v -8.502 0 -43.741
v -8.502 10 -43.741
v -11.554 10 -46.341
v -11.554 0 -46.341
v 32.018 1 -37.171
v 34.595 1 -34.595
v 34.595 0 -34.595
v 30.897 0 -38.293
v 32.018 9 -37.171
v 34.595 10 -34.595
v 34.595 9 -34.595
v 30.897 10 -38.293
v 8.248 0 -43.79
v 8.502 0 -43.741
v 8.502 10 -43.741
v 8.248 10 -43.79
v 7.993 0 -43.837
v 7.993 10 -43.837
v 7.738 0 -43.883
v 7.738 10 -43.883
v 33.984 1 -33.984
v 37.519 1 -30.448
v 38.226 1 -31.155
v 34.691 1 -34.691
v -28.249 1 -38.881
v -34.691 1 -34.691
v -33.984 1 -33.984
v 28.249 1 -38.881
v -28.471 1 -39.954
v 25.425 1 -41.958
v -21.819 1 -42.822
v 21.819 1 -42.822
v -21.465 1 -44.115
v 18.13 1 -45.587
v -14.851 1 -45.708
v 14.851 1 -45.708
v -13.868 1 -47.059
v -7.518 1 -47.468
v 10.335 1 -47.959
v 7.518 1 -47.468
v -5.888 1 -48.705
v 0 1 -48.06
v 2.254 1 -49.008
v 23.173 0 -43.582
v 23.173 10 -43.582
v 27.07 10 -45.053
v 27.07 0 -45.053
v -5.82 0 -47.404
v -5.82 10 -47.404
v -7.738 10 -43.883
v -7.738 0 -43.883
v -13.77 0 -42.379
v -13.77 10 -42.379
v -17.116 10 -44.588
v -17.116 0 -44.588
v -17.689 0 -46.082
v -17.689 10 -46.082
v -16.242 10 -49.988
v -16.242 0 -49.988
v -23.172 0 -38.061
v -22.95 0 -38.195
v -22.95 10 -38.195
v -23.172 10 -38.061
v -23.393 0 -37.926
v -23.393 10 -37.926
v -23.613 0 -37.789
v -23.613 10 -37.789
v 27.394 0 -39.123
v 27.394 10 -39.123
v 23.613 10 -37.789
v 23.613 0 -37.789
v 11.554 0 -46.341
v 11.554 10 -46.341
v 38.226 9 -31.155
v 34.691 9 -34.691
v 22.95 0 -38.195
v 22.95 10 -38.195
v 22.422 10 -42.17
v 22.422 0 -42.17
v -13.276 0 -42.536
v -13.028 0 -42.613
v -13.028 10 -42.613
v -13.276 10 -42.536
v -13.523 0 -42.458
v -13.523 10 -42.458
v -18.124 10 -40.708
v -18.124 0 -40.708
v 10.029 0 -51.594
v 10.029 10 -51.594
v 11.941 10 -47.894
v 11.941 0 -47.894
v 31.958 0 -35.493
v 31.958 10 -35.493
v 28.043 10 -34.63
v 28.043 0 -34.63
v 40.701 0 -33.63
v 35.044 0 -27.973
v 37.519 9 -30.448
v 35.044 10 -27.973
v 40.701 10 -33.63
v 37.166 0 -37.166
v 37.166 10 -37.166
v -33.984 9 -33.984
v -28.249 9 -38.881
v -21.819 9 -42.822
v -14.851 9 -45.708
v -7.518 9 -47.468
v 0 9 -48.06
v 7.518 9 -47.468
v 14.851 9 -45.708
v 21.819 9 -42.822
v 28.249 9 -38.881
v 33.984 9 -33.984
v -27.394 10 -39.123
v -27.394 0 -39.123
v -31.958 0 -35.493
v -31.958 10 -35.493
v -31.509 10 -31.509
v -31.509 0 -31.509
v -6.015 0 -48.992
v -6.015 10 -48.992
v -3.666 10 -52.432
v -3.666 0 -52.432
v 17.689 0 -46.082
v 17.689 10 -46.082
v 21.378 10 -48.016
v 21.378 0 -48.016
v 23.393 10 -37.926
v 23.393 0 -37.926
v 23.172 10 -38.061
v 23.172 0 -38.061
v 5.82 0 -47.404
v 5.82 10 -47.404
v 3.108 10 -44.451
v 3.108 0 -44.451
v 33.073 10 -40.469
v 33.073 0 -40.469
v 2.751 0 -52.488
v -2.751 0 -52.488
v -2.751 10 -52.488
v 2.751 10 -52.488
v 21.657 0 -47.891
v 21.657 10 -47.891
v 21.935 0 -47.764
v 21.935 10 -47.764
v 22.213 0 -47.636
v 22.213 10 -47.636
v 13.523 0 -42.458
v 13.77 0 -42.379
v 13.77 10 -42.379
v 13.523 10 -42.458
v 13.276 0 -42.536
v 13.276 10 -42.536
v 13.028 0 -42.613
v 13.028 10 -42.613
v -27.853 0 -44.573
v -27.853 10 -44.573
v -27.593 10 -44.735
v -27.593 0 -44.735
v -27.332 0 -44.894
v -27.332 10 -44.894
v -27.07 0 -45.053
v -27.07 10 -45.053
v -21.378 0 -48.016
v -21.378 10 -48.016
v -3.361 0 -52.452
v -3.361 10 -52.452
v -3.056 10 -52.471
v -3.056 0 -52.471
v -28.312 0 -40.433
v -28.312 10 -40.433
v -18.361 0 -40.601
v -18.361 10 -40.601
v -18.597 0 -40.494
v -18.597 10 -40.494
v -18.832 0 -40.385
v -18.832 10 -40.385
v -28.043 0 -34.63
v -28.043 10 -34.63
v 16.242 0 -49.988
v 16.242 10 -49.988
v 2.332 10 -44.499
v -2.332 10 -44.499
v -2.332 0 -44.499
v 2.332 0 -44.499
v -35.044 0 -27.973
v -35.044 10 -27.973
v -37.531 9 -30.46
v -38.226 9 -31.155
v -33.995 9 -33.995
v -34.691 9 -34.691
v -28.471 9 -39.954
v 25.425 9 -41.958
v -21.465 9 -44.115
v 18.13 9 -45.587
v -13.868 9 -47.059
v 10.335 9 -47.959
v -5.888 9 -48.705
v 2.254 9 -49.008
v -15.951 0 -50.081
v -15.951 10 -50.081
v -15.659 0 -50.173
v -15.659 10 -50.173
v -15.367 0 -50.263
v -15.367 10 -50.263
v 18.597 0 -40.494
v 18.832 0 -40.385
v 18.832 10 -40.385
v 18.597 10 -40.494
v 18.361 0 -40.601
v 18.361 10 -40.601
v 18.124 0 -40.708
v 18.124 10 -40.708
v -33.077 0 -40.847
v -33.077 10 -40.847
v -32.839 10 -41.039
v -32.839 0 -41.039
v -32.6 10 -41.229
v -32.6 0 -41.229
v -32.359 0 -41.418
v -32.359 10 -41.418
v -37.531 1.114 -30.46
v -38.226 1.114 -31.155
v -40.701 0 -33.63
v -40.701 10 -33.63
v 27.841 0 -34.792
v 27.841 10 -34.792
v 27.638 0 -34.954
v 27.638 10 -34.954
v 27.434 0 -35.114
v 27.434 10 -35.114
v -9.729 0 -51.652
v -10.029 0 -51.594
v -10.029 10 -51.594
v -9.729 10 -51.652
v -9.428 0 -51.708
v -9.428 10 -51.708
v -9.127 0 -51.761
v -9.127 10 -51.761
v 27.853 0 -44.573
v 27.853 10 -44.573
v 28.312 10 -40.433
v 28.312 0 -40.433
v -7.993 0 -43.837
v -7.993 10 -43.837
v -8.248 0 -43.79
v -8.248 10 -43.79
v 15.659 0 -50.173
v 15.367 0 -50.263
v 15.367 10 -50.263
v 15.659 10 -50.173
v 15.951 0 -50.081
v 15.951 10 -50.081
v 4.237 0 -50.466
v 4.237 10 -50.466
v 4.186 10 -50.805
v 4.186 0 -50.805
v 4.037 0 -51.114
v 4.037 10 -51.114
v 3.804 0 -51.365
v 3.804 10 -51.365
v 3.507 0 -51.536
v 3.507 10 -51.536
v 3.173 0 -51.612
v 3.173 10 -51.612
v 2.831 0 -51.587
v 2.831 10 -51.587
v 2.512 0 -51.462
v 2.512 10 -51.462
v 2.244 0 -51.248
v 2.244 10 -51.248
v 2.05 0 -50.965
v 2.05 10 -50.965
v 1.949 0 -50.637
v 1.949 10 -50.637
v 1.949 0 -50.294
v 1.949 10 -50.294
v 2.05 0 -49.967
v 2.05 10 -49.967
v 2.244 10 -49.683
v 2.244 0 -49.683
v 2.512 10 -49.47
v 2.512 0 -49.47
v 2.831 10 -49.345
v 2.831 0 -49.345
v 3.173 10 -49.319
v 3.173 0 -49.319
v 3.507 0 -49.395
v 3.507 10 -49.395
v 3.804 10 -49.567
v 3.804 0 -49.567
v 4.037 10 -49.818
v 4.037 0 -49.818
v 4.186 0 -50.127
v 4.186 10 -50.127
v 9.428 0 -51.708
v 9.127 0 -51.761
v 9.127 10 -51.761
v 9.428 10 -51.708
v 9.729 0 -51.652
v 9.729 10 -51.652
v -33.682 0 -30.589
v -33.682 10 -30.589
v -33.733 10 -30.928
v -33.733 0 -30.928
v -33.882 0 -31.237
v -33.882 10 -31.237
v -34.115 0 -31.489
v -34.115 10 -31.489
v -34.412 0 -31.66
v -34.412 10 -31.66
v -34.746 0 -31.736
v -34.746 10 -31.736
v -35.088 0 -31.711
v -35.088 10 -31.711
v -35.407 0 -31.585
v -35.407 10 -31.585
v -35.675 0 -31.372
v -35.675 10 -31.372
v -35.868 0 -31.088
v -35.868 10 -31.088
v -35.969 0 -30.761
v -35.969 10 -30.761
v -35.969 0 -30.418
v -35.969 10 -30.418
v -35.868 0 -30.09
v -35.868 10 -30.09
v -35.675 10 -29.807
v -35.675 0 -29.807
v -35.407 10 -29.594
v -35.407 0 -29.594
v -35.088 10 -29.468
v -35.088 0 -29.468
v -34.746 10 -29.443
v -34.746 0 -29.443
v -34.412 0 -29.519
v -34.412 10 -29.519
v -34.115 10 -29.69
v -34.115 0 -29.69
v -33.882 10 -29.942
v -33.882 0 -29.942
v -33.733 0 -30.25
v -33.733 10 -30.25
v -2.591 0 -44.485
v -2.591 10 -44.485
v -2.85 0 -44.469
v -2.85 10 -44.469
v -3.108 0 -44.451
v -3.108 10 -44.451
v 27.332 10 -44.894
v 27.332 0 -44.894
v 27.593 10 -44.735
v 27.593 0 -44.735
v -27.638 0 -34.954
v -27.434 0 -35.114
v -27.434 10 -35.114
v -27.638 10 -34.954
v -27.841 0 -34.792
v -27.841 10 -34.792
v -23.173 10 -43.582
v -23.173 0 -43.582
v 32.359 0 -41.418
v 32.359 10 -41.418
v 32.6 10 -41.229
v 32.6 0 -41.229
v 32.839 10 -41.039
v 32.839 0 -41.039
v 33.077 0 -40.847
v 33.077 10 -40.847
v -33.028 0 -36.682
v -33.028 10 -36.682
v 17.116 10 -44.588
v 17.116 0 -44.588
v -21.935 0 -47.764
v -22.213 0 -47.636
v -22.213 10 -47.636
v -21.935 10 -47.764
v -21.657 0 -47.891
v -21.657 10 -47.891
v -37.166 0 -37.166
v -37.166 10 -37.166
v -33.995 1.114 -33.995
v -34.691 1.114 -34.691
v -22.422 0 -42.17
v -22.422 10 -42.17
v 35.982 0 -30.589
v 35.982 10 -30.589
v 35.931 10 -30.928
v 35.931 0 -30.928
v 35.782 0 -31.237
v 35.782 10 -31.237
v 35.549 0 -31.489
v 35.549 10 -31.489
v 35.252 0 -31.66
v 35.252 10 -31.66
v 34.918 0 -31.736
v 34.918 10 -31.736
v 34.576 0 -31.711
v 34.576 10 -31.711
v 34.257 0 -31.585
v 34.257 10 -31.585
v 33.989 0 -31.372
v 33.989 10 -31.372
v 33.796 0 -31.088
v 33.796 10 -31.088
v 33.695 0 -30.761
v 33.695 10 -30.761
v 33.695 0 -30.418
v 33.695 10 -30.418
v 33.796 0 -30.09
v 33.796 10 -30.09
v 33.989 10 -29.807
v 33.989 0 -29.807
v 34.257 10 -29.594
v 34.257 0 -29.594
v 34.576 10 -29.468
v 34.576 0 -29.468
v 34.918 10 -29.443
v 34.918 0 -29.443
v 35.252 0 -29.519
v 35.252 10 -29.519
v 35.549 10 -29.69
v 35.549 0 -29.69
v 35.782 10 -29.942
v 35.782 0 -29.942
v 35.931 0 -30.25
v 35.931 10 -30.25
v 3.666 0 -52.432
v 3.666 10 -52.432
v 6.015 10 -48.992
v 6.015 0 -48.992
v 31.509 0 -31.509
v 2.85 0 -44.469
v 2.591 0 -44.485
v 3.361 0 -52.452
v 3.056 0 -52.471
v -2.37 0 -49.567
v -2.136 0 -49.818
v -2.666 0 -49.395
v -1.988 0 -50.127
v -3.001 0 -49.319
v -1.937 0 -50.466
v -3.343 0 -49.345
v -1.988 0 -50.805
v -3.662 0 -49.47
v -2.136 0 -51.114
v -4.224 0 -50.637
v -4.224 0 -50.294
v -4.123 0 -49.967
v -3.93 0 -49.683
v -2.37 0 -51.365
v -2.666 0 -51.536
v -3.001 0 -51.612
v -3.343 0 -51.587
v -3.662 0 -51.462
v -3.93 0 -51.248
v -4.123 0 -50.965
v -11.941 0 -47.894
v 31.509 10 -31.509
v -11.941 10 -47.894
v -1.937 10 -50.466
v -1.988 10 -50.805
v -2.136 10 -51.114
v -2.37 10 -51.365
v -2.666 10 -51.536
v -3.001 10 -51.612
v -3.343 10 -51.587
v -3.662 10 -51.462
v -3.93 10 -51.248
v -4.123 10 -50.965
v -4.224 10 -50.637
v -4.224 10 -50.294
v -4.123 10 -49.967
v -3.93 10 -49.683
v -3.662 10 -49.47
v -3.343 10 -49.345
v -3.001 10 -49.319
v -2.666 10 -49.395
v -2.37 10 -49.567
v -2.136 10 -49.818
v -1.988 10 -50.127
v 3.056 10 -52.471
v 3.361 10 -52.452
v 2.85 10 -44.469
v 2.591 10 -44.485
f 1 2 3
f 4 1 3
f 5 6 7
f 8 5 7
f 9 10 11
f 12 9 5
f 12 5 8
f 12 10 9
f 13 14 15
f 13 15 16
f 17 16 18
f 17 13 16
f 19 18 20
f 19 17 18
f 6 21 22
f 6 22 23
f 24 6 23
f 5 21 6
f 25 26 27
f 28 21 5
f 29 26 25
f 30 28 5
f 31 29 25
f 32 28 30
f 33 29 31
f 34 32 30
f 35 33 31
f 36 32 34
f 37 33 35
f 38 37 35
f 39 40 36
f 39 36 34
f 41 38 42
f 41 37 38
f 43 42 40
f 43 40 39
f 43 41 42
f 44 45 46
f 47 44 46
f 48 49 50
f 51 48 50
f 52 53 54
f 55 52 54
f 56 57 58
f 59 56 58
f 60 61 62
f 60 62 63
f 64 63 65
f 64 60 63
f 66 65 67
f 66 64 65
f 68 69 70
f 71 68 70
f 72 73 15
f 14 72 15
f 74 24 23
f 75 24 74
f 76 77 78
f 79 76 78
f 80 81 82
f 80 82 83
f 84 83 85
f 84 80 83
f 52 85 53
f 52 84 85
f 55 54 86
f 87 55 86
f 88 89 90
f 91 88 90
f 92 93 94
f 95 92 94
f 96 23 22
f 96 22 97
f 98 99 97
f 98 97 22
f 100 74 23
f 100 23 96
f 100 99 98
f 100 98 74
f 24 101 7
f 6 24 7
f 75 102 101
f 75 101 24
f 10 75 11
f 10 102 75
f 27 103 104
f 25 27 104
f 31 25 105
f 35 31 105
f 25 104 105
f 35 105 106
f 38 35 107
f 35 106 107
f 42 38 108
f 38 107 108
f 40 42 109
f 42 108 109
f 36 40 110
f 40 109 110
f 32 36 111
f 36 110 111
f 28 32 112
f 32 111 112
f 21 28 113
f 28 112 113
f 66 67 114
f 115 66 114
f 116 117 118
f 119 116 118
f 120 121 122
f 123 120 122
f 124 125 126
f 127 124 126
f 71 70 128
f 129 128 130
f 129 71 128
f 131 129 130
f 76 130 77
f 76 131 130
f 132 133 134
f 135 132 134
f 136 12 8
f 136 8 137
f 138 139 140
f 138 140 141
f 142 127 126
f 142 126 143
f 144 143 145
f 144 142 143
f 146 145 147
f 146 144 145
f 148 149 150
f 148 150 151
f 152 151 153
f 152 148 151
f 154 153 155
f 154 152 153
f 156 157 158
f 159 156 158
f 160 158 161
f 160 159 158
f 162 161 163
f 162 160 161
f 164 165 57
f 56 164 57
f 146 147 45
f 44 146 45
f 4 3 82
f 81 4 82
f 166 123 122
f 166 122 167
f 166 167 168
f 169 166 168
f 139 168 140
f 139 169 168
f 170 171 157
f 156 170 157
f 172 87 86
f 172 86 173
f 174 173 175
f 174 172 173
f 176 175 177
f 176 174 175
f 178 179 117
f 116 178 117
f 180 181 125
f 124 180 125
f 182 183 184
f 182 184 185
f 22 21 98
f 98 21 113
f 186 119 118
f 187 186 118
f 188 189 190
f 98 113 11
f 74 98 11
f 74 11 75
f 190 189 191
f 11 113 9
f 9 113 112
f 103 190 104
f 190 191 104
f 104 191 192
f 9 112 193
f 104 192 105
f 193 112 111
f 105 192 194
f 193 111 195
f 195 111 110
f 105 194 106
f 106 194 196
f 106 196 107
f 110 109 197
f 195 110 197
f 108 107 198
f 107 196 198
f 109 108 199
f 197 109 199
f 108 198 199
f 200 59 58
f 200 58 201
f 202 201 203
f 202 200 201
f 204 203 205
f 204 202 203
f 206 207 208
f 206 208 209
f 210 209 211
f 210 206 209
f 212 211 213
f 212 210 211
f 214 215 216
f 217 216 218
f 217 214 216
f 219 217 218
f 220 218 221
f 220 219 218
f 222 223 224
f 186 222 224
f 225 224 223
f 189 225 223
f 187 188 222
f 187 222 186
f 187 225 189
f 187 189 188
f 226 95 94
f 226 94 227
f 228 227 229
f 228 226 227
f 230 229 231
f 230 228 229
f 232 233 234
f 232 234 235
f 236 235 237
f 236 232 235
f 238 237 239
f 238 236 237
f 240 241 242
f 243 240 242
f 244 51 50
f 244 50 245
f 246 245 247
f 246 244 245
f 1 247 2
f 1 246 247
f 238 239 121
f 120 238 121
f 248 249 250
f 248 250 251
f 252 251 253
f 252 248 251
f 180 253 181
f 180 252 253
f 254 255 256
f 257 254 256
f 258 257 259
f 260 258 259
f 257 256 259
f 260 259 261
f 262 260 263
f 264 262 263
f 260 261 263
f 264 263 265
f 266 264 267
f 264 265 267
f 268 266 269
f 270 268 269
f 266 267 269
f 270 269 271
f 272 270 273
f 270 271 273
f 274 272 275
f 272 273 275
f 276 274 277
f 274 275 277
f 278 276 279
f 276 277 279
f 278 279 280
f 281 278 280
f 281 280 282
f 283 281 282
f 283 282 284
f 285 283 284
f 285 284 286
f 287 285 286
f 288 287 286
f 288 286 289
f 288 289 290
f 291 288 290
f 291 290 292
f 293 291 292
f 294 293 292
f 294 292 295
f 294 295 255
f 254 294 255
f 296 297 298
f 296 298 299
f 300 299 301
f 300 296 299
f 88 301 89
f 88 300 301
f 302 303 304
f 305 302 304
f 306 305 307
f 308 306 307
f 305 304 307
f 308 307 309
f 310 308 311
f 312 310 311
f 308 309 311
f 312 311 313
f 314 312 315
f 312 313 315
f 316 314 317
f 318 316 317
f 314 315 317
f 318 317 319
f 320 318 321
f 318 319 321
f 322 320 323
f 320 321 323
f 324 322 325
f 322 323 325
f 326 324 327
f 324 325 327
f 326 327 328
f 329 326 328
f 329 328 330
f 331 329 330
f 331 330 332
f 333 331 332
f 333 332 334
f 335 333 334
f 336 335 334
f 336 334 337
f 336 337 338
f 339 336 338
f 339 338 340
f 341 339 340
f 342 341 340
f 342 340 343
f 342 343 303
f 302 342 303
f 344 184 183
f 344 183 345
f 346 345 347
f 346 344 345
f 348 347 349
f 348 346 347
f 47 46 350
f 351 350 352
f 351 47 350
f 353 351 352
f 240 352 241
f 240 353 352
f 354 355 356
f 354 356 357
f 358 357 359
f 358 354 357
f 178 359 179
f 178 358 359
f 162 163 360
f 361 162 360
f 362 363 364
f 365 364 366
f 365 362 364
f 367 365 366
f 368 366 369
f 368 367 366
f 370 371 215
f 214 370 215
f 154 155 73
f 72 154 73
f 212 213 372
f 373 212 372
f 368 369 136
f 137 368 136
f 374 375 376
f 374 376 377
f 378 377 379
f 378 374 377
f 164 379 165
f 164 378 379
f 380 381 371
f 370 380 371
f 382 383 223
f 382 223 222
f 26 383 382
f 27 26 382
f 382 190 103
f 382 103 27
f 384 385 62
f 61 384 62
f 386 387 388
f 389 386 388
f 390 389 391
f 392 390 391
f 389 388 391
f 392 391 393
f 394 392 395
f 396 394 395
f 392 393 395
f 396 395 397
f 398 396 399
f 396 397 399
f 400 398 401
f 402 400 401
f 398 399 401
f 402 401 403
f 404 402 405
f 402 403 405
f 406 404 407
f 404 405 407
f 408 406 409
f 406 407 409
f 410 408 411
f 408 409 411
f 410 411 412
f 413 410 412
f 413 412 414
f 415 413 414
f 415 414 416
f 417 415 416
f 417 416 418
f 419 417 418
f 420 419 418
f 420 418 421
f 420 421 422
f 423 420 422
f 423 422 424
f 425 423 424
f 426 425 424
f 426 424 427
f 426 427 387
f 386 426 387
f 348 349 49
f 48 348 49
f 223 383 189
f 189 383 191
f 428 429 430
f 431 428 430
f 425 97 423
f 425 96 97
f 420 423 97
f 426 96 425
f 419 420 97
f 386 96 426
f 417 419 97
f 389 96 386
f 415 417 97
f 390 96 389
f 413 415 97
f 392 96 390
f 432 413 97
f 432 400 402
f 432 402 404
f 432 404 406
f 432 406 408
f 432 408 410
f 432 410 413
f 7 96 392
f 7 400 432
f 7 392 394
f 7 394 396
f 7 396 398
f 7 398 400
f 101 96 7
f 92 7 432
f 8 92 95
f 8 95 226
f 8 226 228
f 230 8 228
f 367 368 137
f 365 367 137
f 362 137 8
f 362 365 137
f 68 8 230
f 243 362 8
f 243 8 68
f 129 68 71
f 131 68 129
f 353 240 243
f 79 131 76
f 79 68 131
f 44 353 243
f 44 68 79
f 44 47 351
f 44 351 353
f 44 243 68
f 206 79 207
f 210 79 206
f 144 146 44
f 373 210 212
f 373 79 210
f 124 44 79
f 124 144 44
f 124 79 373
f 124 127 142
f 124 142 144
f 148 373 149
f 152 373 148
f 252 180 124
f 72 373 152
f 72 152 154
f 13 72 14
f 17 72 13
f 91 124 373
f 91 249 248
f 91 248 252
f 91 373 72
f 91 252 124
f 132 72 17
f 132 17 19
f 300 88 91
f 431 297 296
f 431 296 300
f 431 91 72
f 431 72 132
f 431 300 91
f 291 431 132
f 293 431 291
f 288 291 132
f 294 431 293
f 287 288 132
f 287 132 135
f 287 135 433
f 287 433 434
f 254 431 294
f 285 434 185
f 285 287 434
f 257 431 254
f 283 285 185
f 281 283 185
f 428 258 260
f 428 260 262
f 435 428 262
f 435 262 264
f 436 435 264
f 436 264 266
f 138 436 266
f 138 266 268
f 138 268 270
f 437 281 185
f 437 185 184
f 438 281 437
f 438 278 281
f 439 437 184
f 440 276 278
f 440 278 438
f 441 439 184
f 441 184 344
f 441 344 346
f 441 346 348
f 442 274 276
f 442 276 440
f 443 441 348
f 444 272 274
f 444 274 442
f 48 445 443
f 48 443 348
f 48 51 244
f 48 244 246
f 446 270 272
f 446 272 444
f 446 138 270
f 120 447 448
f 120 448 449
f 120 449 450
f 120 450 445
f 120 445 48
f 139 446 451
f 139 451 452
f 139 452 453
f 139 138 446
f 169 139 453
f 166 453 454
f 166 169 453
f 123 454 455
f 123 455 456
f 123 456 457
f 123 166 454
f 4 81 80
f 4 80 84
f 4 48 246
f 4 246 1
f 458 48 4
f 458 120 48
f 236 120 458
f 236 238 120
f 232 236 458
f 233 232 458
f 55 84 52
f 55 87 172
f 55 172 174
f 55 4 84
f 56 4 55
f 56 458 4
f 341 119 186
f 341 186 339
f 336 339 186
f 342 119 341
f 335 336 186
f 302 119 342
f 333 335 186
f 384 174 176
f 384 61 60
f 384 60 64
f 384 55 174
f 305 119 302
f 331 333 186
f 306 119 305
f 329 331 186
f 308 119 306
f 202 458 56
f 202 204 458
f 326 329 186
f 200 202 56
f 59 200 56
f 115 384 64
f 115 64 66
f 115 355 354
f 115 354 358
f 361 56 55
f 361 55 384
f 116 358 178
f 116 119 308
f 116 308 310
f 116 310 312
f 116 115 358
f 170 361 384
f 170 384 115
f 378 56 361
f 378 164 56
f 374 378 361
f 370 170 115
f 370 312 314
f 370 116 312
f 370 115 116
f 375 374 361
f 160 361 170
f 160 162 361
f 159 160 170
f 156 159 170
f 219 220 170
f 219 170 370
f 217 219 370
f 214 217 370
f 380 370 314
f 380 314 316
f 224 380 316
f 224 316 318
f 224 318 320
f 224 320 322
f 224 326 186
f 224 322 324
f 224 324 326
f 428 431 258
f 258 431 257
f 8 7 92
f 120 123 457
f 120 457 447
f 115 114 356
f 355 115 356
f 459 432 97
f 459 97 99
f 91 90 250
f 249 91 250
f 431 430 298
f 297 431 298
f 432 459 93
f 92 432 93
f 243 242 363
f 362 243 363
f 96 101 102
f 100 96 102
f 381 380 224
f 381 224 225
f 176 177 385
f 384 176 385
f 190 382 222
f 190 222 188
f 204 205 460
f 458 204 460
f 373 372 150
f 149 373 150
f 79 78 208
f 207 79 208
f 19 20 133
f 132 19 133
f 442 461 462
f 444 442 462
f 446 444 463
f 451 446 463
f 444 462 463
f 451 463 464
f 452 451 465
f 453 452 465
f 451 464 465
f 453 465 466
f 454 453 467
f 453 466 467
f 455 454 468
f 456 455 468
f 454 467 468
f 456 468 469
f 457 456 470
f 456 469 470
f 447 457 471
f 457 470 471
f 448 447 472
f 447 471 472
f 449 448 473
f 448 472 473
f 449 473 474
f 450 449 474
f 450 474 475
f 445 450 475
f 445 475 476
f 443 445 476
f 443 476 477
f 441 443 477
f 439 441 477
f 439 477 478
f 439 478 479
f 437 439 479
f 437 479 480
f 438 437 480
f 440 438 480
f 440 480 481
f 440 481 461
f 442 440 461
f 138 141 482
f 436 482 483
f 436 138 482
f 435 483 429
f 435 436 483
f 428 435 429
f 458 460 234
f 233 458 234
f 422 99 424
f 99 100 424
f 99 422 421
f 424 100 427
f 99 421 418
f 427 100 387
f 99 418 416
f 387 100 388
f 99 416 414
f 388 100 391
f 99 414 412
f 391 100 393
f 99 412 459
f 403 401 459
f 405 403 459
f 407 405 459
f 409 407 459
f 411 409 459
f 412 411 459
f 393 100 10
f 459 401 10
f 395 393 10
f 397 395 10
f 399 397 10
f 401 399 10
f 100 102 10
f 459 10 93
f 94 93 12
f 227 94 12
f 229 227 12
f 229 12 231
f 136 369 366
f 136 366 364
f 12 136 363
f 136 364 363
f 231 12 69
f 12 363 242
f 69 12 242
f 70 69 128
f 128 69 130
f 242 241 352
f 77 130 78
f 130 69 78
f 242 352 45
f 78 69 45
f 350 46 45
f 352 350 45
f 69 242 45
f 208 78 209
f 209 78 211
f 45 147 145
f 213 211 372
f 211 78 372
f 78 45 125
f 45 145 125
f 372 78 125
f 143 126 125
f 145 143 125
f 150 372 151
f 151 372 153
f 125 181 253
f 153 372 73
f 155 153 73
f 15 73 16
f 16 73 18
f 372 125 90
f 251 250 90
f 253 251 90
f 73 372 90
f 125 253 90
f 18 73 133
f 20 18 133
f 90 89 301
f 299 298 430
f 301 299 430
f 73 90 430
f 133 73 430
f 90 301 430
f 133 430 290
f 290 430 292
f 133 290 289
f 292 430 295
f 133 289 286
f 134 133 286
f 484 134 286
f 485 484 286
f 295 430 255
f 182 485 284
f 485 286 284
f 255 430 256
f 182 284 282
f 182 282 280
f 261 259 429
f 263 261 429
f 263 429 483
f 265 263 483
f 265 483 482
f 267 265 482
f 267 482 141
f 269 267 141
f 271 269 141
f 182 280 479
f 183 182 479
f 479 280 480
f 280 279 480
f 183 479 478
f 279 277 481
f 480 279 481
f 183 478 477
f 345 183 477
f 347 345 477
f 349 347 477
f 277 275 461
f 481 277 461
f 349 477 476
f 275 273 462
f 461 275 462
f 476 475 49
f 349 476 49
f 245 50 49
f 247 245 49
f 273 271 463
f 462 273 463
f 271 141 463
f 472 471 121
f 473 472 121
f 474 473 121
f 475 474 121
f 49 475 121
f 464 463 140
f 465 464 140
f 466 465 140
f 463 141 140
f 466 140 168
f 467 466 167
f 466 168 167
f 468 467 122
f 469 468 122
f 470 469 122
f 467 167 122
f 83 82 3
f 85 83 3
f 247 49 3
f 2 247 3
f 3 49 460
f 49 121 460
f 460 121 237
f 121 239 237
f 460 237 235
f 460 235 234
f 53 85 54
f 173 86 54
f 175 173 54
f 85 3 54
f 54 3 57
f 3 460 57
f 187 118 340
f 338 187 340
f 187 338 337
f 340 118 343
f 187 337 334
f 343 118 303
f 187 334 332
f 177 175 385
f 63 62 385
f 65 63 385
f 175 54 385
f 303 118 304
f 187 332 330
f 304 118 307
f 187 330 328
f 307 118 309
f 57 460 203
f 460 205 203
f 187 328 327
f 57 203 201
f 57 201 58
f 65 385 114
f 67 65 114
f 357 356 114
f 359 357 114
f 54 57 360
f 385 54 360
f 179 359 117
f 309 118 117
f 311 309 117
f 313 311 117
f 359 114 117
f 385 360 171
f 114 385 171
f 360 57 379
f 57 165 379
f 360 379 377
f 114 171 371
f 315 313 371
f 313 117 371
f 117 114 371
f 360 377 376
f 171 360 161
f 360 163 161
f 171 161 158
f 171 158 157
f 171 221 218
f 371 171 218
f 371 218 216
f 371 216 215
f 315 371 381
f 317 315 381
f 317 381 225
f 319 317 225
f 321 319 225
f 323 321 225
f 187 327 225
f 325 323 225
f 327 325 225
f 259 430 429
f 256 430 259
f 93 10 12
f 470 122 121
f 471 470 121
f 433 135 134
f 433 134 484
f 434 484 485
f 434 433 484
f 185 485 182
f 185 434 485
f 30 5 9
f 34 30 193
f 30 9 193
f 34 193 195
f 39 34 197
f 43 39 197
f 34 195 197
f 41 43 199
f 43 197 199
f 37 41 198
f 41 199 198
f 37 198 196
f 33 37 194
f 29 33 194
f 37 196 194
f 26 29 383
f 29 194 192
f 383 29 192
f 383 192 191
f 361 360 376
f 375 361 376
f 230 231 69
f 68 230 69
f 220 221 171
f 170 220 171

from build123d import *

# Parameters (mm, degrees)
BOSS_EXTRUDE1_DEPTH = 10
CUT_EXTRUDE1_DEPTH  = 10
CIRPATTERN1_COUNT   = 13
CIRPATTERN1_ANGLE   = 84
CUT_EXTRUDE2_START  = -1
CUT_EXTRUDE2_DEPTH  = 8
SKETCH5_W           = 8
SKETCH5_H           = 10
SKETCH5_W_2         = 0.983564582
SKETCH5_H_2         = 7.885827621
BOSS_EXTRUDE2_DEPTH = 5
SKETCH6_W           = 8
SKETCH6_H           = 10
SKETCH6_W_2         = 1
SKETCH6_H_2         = 8
BOSS_EXTRUDE3_DEPTH = 5
SKETCH7_R           = 1.15
CUT_EXTRUDE3_DEPTH  = 20
SKETCH9_R           = 1.15
CUT_EXTRUDE4_DEPTH  = 26
SKETCH10_R          = 1.15
CUT_EXTRUDE5_DEPTH  = 26
BOSS_EXTRUDE4_DEPTH = 10
CUT_EXTRUDE7_DEPTH  = 26


with BuildPart() as part:
    # Sketch1 → Boss-Extrude1 (new body)
    with BuildSketch(Plane(origin=(0, 0, 0), x_dir=(1, 0, 0), z_dir=(0, 1, 0))):
        with BuildLine():
            Line((-31.50867817, 31.50867817), (-37.165532419, 37.165532419))
            ThreePointArc((-37.165532419, 37.165532419), (0, 52.56), (37.165532419, 37.165532419))
            Line((37.165532419, 37.165532419), (31.50867817, 31.50867817))
            ThreePointArc((31.50867817, 31.50867817), (0, 44.56), (-31.50867817, 31.50867817))
        make_face()
    extrude(amount=BOSS_EXTRUDE1_DEPTH)

    # Sketch3 → Cut-Extrude1 (cut)
    with BuildSketch(Plane(origin=(0, 10, 0), x_dir=(1, 0, 0), z_dir=(0, 1, 0))):
        with BuildLine():
            Line((-31.95767776, 35.492596865), (-31.50867817, 31.50867817))
            ThreePointArc((-31.50867817, 31.50867817), (-29.816459819, 33.114533423), (-28.042516625, 34.629624043))
            Line((-28.042516625, 34.629624043), (-31.95767776, 35.492596865))
        make_face()
        with BuildLine():
            Line((-33.02828673, 36.681628586), (-33.077079754, 40.846791734))
            ThreePointArc((-33.077079754, 40.846791734), (-35.16950467, 39.059692027), (-37.165532419, 37.165532419))
            Line((-37.165532419, 37.165532419), (-33.02828673, 36.681628586))
        make_face()
    cut_extrude1 = extrude(amount=-CUT_EXTRUDE1_DEPTH, mode=Mode.SUBTRACT)

    # CirPattern1: Cut-Extrude1 ×13 about axis
    cirpattern1_axis = Axis((0, 0, 0), (0, -1, 0))
    for i in range(1, CIRPATTERN1_COUNT):
        add(cut_extrude1.rotate(cirpattern1_axis, i * CIRPATTERN1_ANGLE / (CIRPATTERN1_COUNT - 1)), mode=Mode.SUBTRACT)

    # Sketch4 → Cut-Extrude2 (cut)
    with BuildSketch(Plane(origin=(0, 10, 0), x_dir=(1, 0, 0), z_dir=(0, 1, 0)).offset(CUT_EXTRUDE2_START)):
        with BuildLine():
            Line((33.983551904, 33.983551904), (34.690658685, 34.690658685))
            ThreePointArc((34.690658685, 34.690658685), (0, 49.06), (-34.690658685, 34.690658685))
            Line((-34.690658685, 34.690658685), (-33.983551904, 33.983551904))
            ThreePointArc((-33.983551904, 33.983551904), (0, 48.06), (33.983551904, 33.983551904))
        make_face()
    extrude(amount=-CUT_EXTRUDE2_DEPTH, mode=Mode.SUBTRACT)

    # Sketch5 → Boss-Extrude2 (add)
    with BuildSketch(Plane(origin=(0, 0, 0), x_dir=(0.707106781, 0, 0.707106781), z_dir=(-0.707106781, 0, 0.707106781))):
        with Locations((-48.56, 5)):
            Rectangle(SKETCH5_W, SKETCH5_H)
        with Locations((-48.568217709, 5.057086189)):
            Rectangle(SKETCH5_W_2, SKETCH5_H_2, mode=Mode.SUBTRACT)
    extrude(amount=BOSS_EXTRUDE2_DEPTH)

    # Sketch6 → Boss-Extrude3 (add)
    with BuildSketch(Plane(origin=(0, 0, 0), x_dir=(0.707106781, 0, -0.707106781), z_dir=(0.707106781, 0, 0.707106781))):
        with Locations((48.56, 5)):
            Rectangle(SKETCH6_W, SKETCH6_H)
        with Locations((48.56, 5)):
            Rectangle(SKETCH6_W_2, SKETCH6_H_2, mode=Mode.SUBTRACT)
    extrude(amount=BOSS_EXTRUDE3_DEPTH)

    # Sketch7 → Cut-Extrude3 (cut)
    with BuildSketch(Plane(origin=(0, 10, 0), x_dir=(1, 0, 0), z_dir=(0, 1, 0))):
        with Locations((-3.086614159, 50.465695408)):
            Circle(SKETCH7_R)
        with Locations((3.086614159, 50.465695408)):
            Circle(SKETCH7_R)
    extrude(amount=-CUT_EXTRUDE3_DEPTH, mode=Mode.SUBTRACT)

    # Sketch9 → Cut-Extrude4 (cut)
    with BuildSketch(Plane(origin=(0, 10, 0), x_dir=(1, 0, 0), z_dir=(0, 1, 0))):
        with Locations((34.832080041, 30.589439354)):
            Circle(SKETCH9_R)
    extrude(amount=-CUT_EXTRUDE4_DEPTH, mode=Mode.SUBTRACT)

    # Sketch10 → Cut-Extrude5 (cut)
    with BuildSketch(Plane(origin=(0, 10, 0), x_dir=(1, 0, 0), z_dir=(0, 1, 0))):
        with Locations((-34.832080041, 30.589439354)):
            Circle(SKETCH10_R)
    extrude(amount=-CUT_EXTRUDE5_DEPTH, mode=Mode.SUBTRACT)

    # Sketch11 → Boss-Extrude4 (add)
    with BuildSketch(Plane(origin=(0, 10, 0), x_dir=(1, 0, 0), z_dir=(0, 1, 0))):
        Polygon((-2.75077786, 52.487968347), (2.75077786, 52.487968347), (0, 49.36), align=None)
        Polygon((0, 47.76), (-2.33209021, 44.498932069), (2.33209021, 44.498932069), align=None)
    extrude(amount=-BOSS_EXTRUDE4_DEPTH)

    # Sketch14 → Cut-Extrude7 (cut)
    with BuildSketch(Plane(origin=(0, 10, 0), x_dir=(1, 0, 0), z_dir=(0, 1, 0))):
        Polygon((37.165532419, 37.165532419), (34.594853292, 34.594853292), (30.896603346, 38.293103238), (33.467282473, 40.863782365), align=None)
    extrude(amount=-CUT_EXTRUDE7_DEPTH, mode=Mode.SUBTRACT)


solid = part.part
